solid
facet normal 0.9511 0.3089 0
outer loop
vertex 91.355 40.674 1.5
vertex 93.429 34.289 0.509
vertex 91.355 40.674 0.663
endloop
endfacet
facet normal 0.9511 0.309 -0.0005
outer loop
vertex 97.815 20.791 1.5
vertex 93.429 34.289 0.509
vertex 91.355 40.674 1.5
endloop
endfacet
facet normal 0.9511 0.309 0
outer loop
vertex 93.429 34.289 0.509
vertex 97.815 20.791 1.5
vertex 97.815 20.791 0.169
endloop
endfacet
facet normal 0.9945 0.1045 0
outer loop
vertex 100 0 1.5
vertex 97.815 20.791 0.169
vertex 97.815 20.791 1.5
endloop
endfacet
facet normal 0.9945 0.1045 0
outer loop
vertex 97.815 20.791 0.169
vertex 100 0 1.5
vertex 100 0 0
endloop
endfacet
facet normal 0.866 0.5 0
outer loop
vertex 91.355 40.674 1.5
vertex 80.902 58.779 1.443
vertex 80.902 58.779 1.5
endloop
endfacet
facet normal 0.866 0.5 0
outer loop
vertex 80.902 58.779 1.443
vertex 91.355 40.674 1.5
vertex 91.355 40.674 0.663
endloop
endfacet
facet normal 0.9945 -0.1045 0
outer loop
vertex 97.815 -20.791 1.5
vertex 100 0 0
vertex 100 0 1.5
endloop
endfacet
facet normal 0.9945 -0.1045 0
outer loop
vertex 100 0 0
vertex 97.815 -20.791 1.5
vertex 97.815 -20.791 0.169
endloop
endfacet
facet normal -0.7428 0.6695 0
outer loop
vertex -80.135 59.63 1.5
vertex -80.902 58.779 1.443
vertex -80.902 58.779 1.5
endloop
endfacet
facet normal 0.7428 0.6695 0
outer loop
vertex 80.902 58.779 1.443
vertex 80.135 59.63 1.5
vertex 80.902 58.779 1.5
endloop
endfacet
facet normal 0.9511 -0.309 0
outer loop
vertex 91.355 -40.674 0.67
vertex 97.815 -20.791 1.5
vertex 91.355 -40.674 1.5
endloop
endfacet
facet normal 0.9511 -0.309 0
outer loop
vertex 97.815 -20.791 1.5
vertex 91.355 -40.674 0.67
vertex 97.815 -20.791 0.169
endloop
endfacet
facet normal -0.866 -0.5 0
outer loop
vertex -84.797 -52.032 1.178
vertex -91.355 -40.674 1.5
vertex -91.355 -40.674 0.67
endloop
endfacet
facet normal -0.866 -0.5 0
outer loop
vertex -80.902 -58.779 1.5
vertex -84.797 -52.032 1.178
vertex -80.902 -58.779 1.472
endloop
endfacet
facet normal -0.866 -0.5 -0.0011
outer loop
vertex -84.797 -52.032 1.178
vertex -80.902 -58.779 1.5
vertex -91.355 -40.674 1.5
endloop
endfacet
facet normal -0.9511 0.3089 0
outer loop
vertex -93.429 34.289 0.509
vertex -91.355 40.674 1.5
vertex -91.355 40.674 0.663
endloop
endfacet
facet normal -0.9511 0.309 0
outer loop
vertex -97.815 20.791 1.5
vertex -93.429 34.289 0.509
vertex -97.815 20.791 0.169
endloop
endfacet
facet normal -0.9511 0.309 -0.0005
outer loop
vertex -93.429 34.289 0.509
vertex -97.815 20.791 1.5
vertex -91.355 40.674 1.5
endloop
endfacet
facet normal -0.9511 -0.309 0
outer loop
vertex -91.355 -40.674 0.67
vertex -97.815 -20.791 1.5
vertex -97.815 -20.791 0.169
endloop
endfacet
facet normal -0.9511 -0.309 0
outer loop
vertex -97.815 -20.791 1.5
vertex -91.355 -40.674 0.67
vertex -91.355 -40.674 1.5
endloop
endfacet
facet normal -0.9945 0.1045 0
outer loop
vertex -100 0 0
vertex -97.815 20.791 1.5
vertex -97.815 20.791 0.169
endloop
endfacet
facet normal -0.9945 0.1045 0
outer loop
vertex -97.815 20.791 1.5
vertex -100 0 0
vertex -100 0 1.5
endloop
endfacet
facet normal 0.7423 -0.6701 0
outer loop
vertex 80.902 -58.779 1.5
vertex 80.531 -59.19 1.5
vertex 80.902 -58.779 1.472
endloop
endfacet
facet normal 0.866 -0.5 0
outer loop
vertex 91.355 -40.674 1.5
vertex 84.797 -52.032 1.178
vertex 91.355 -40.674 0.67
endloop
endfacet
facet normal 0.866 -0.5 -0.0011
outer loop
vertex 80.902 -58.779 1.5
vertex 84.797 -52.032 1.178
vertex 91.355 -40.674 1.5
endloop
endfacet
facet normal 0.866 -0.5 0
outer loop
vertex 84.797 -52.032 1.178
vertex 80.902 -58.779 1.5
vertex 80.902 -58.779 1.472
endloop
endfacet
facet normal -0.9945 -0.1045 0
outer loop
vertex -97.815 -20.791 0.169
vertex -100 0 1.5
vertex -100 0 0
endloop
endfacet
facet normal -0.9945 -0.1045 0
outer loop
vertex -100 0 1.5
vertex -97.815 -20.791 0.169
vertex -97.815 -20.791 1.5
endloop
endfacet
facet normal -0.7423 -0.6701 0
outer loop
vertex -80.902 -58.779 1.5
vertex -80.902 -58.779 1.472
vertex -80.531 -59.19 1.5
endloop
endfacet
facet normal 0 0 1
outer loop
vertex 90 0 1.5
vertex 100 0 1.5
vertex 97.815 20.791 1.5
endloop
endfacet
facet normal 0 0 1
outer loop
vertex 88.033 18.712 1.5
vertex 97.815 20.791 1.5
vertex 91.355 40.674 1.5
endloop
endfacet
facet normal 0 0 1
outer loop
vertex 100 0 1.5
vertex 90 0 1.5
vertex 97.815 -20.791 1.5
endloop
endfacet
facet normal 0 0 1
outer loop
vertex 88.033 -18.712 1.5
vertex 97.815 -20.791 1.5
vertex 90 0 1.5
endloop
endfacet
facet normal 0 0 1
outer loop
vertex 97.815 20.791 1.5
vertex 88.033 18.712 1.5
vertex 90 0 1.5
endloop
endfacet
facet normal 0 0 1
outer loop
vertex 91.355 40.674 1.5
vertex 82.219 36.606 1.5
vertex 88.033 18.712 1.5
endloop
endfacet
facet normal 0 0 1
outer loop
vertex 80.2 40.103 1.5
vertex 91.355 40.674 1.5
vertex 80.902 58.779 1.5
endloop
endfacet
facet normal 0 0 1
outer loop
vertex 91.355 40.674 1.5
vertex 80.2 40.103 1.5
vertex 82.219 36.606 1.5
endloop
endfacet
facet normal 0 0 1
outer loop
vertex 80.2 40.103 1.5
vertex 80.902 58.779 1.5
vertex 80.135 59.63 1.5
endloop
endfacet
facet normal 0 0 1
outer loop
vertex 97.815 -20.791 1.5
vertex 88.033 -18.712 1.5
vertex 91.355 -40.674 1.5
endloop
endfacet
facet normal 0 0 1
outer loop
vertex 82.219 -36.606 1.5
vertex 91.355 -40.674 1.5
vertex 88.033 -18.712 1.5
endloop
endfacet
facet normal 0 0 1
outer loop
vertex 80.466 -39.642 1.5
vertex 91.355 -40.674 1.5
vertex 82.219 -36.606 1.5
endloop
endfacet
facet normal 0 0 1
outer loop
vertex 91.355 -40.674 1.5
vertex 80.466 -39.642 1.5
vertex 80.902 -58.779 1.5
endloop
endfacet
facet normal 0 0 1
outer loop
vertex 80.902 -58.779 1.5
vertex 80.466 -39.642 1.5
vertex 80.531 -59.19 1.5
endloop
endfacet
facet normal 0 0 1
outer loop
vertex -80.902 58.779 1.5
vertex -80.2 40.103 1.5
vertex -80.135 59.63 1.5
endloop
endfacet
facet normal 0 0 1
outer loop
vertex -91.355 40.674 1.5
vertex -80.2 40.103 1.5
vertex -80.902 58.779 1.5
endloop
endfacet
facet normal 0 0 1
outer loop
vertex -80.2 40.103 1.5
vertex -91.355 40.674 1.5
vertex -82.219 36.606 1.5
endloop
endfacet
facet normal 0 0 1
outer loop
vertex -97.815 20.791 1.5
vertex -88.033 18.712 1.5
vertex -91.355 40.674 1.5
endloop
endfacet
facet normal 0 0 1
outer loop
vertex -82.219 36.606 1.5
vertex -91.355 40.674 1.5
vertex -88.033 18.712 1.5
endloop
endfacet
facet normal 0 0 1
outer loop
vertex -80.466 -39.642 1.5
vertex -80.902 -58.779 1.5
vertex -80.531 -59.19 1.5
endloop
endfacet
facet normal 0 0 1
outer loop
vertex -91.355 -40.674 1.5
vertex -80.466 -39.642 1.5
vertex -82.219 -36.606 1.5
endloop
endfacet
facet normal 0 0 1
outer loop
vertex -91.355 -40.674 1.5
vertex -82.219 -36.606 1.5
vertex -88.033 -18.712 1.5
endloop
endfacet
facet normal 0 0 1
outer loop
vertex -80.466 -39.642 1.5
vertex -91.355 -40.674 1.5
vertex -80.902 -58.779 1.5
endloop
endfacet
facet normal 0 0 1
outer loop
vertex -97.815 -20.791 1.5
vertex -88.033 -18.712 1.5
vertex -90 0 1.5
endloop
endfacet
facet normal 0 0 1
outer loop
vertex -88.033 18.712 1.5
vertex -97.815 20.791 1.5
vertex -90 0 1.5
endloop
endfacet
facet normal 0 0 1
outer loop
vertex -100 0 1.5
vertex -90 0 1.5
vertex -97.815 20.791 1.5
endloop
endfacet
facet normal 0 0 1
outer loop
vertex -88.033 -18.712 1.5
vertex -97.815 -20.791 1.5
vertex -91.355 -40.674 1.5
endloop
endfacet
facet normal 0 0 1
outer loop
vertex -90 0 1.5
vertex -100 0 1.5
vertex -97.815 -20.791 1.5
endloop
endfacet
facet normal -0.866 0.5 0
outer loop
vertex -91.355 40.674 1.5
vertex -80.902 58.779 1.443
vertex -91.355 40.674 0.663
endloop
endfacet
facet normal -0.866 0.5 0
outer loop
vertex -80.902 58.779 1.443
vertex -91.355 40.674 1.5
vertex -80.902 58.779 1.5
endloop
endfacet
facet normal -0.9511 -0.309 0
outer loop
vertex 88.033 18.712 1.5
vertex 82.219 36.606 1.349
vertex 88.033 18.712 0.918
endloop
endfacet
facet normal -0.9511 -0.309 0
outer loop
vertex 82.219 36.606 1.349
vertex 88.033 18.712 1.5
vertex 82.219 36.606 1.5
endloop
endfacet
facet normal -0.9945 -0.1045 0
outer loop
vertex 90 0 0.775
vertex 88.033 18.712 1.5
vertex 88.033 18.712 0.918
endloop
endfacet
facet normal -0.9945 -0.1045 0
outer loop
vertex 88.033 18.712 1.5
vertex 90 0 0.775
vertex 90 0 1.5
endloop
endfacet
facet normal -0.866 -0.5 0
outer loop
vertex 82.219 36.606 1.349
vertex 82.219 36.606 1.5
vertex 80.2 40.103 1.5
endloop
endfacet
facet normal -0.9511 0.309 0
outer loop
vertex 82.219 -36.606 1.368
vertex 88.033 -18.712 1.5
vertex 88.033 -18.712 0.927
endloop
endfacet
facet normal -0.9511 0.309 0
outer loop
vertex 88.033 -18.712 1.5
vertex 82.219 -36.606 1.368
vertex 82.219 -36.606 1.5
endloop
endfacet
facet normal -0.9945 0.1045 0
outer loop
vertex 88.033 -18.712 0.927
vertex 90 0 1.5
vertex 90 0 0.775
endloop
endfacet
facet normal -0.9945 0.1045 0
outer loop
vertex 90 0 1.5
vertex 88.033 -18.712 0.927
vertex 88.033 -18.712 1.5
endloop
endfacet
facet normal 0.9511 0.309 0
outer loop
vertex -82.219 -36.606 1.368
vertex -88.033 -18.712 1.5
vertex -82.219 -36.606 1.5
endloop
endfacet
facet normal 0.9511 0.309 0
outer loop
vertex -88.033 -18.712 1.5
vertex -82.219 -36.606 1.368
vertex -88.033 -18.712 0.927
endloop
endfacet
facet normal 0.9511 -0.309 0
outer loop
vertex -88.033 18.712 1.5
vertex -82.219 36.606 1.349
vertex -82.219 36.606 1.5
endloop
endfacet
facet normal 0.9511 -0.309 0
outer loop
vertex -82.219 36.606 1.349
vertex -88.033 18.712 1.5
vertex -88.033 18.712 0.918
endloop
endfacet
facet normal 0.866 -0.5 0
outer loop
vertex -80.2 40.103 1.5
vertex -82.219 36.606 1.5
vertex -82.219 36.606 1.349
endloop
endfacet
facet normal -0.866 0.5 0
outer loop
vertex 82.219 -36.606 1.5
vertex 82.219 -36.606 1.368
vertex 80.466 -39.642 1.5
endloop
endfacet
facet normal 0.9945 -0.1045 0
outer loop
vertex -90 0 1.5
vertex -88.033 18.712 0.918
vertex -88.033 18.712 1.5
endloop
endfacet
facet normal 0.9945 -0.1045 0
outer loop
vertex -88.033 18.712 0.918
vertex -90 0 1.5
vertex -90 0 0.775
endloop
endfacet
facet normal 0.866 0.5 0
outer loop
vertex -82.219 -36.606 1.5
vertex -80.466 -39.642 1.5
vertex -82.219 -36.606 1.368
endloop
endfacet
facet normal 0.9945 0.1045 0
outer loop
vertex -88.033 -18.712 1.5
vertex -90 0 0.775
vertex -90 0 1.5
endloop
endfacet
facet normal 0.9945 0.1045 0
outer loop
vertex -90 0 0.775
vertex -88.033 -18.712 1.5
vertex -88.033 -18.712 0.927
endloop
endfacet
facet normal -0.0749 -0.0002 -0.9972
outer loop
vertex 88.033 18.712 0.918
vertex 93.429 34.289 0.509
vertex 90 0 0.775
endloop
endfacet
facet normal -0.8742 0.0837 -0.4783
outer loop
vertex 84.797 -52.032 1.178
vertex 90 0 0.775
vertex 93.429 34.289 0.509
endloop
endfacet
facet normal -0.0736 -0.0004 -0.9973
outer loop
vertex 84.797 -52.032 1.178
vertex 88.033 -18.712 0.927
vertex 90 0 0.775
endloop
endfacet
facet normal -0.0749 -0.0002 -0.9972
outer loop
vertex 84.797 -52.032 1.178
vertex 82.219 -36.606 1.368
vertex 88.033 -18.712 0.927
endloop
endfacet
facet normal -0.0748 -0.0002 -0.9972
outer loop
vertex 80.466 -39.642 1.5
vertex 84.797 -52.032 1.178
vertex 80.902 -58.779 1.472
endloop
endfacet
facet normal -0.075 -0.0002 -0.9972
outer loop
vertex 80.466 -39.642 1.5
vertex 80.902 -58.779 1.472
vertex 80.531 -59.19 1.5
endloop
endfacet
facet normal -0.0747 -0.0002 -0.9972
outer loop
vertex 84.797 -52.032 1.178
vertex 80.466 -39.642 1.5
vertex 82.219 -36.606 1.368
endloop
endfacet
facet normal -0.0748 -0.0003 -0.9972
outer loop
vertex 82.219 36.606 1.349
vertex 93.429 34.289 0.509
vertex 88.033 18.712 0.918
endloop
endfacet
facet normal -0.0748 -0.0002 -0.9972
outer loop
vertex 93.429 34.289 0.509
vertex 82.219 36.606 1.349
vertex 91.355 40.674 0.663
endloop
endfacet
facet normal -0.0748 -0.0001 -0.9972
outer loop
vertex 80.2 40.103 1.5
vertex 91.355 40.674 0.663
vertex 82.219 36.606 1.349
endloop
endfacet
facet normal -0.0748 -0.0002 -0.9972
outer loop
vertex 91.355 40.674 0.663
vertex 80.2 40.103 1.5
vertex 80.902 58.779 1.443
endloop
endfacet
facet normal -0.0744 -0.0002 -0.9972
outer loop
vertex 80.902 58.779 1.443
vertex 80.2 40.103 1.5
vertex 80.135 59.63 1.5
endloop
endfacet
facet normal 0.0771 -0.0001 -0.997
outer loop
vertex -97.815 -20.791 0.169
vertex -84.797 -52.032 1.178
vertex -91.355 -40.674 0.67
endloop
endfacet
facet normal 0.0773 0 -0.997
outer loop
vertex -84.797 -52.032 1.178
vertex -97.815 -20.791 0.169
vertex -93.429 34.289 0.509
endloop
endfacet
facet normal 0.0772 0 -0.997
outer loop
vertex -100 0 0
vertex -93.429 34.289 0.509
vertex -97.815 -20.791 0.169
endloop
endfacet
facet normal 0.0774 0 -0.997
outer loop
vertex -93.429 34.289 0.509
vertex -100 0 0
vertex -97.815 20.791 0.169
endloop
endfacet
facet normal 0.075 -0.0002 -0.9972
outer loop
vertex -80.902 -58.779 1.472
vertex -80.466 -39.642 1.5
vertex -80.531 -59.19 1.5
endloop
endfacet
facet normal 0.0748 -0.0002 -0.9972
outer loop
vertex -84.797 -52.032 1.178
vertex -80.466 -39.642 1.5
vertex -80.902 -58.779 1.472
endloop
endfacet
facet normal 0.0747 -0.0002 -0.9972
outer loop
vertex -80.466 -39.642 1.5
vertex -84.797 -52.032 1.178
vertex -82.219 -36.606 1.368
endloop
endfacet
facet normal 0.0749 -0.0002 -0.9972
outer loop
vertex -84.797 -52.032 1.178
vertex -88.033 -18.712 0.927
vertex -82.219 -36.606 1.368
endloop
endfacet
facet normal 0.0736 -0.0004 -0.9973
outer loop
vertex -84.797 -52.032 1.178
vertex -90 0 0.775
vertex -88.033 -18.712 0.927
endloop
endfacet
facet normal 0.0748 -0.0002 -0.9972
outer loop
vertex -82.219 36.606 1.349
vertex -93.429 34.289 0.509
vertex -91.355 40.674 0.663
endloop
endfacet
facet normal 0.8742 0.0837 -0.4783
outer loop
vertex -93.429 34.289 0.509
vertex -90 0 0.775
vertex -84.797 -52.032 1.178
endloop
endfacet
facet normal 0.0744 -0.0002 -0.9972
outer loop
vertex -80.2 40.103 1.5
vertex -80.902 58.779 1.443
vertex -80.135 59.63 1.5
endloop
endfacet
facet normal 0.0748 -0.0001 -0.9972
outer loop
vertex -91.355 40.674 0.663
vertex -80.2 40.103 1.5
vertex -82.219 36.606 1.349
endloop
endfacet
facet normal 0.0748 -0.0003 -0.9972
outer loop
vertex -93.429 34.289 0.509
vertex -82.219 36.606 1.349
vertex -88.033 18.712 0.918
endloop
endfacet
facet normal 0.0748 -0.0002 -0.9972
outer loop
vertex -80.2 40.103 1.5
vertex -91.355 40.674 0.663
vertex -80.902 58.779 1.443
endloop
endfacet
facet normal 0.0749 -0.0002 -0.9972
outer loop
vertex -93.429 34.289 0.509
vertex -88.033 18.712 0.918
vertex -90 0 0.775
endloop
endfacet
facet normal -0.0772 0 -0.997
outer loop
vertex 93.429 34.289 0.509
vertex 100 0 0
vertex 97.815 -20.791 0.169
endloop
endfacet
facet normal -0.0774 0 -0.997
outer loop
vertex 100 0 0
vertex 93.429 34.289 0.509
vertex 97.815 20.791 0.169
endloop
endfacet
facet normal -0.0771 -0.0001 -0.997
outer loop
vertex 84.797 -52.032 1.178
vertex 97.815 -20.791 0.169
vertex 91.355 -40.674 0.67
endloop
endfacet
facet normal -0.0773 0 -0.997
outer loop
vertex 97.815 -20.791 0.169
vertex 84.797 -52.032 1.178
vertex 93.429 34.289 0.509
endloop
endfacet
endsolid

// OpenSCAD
module p() {
 cube([.0001,.0001,.0001],center=true);
}

module daek() {
hull() {

translate([100,100,0]) p();
translate([80,100,1.5]) p();
translate([60,100,2.45]) p();
translate([40,100,3.15]) p();
translate([20,100,3.8]) p();
translate([0,100,3.85]) p();
translate([-20,100,3.8]) p();
translate([-40,100,3.15]) p();
translate([-60,100,2.45]) p();
translate([-80,100,1.5]) p();
translate([-100,100,0]) p();

translate([100,-100,0]) p();
translate([80,-100,1.55]) p();
translate([60,-100,2.75]) p();
translate([40,-100,3.35]) p();
translate([20,-100,4.3]) p();
translate([0,-100,4.5]) p();
translate([-20,-100,4.3]) p();
translate([-40,-100,3.35]) p();
translate([-60,-100,2.75]) p();
translate([-80,-100,1.55]) p();
translate([-100,-100,0]) p();

translate([0,0,-50]) cube([200,200,1],center=true);
}
}


difference() {
union() {
difference() {
cylinder(r=100,h=3,center=true);
cylinder(r=90,h=12,center=true);
}
translate([0,-90,0]) cylinder(r=5,h=3,center=true);
}
#daek();
}
